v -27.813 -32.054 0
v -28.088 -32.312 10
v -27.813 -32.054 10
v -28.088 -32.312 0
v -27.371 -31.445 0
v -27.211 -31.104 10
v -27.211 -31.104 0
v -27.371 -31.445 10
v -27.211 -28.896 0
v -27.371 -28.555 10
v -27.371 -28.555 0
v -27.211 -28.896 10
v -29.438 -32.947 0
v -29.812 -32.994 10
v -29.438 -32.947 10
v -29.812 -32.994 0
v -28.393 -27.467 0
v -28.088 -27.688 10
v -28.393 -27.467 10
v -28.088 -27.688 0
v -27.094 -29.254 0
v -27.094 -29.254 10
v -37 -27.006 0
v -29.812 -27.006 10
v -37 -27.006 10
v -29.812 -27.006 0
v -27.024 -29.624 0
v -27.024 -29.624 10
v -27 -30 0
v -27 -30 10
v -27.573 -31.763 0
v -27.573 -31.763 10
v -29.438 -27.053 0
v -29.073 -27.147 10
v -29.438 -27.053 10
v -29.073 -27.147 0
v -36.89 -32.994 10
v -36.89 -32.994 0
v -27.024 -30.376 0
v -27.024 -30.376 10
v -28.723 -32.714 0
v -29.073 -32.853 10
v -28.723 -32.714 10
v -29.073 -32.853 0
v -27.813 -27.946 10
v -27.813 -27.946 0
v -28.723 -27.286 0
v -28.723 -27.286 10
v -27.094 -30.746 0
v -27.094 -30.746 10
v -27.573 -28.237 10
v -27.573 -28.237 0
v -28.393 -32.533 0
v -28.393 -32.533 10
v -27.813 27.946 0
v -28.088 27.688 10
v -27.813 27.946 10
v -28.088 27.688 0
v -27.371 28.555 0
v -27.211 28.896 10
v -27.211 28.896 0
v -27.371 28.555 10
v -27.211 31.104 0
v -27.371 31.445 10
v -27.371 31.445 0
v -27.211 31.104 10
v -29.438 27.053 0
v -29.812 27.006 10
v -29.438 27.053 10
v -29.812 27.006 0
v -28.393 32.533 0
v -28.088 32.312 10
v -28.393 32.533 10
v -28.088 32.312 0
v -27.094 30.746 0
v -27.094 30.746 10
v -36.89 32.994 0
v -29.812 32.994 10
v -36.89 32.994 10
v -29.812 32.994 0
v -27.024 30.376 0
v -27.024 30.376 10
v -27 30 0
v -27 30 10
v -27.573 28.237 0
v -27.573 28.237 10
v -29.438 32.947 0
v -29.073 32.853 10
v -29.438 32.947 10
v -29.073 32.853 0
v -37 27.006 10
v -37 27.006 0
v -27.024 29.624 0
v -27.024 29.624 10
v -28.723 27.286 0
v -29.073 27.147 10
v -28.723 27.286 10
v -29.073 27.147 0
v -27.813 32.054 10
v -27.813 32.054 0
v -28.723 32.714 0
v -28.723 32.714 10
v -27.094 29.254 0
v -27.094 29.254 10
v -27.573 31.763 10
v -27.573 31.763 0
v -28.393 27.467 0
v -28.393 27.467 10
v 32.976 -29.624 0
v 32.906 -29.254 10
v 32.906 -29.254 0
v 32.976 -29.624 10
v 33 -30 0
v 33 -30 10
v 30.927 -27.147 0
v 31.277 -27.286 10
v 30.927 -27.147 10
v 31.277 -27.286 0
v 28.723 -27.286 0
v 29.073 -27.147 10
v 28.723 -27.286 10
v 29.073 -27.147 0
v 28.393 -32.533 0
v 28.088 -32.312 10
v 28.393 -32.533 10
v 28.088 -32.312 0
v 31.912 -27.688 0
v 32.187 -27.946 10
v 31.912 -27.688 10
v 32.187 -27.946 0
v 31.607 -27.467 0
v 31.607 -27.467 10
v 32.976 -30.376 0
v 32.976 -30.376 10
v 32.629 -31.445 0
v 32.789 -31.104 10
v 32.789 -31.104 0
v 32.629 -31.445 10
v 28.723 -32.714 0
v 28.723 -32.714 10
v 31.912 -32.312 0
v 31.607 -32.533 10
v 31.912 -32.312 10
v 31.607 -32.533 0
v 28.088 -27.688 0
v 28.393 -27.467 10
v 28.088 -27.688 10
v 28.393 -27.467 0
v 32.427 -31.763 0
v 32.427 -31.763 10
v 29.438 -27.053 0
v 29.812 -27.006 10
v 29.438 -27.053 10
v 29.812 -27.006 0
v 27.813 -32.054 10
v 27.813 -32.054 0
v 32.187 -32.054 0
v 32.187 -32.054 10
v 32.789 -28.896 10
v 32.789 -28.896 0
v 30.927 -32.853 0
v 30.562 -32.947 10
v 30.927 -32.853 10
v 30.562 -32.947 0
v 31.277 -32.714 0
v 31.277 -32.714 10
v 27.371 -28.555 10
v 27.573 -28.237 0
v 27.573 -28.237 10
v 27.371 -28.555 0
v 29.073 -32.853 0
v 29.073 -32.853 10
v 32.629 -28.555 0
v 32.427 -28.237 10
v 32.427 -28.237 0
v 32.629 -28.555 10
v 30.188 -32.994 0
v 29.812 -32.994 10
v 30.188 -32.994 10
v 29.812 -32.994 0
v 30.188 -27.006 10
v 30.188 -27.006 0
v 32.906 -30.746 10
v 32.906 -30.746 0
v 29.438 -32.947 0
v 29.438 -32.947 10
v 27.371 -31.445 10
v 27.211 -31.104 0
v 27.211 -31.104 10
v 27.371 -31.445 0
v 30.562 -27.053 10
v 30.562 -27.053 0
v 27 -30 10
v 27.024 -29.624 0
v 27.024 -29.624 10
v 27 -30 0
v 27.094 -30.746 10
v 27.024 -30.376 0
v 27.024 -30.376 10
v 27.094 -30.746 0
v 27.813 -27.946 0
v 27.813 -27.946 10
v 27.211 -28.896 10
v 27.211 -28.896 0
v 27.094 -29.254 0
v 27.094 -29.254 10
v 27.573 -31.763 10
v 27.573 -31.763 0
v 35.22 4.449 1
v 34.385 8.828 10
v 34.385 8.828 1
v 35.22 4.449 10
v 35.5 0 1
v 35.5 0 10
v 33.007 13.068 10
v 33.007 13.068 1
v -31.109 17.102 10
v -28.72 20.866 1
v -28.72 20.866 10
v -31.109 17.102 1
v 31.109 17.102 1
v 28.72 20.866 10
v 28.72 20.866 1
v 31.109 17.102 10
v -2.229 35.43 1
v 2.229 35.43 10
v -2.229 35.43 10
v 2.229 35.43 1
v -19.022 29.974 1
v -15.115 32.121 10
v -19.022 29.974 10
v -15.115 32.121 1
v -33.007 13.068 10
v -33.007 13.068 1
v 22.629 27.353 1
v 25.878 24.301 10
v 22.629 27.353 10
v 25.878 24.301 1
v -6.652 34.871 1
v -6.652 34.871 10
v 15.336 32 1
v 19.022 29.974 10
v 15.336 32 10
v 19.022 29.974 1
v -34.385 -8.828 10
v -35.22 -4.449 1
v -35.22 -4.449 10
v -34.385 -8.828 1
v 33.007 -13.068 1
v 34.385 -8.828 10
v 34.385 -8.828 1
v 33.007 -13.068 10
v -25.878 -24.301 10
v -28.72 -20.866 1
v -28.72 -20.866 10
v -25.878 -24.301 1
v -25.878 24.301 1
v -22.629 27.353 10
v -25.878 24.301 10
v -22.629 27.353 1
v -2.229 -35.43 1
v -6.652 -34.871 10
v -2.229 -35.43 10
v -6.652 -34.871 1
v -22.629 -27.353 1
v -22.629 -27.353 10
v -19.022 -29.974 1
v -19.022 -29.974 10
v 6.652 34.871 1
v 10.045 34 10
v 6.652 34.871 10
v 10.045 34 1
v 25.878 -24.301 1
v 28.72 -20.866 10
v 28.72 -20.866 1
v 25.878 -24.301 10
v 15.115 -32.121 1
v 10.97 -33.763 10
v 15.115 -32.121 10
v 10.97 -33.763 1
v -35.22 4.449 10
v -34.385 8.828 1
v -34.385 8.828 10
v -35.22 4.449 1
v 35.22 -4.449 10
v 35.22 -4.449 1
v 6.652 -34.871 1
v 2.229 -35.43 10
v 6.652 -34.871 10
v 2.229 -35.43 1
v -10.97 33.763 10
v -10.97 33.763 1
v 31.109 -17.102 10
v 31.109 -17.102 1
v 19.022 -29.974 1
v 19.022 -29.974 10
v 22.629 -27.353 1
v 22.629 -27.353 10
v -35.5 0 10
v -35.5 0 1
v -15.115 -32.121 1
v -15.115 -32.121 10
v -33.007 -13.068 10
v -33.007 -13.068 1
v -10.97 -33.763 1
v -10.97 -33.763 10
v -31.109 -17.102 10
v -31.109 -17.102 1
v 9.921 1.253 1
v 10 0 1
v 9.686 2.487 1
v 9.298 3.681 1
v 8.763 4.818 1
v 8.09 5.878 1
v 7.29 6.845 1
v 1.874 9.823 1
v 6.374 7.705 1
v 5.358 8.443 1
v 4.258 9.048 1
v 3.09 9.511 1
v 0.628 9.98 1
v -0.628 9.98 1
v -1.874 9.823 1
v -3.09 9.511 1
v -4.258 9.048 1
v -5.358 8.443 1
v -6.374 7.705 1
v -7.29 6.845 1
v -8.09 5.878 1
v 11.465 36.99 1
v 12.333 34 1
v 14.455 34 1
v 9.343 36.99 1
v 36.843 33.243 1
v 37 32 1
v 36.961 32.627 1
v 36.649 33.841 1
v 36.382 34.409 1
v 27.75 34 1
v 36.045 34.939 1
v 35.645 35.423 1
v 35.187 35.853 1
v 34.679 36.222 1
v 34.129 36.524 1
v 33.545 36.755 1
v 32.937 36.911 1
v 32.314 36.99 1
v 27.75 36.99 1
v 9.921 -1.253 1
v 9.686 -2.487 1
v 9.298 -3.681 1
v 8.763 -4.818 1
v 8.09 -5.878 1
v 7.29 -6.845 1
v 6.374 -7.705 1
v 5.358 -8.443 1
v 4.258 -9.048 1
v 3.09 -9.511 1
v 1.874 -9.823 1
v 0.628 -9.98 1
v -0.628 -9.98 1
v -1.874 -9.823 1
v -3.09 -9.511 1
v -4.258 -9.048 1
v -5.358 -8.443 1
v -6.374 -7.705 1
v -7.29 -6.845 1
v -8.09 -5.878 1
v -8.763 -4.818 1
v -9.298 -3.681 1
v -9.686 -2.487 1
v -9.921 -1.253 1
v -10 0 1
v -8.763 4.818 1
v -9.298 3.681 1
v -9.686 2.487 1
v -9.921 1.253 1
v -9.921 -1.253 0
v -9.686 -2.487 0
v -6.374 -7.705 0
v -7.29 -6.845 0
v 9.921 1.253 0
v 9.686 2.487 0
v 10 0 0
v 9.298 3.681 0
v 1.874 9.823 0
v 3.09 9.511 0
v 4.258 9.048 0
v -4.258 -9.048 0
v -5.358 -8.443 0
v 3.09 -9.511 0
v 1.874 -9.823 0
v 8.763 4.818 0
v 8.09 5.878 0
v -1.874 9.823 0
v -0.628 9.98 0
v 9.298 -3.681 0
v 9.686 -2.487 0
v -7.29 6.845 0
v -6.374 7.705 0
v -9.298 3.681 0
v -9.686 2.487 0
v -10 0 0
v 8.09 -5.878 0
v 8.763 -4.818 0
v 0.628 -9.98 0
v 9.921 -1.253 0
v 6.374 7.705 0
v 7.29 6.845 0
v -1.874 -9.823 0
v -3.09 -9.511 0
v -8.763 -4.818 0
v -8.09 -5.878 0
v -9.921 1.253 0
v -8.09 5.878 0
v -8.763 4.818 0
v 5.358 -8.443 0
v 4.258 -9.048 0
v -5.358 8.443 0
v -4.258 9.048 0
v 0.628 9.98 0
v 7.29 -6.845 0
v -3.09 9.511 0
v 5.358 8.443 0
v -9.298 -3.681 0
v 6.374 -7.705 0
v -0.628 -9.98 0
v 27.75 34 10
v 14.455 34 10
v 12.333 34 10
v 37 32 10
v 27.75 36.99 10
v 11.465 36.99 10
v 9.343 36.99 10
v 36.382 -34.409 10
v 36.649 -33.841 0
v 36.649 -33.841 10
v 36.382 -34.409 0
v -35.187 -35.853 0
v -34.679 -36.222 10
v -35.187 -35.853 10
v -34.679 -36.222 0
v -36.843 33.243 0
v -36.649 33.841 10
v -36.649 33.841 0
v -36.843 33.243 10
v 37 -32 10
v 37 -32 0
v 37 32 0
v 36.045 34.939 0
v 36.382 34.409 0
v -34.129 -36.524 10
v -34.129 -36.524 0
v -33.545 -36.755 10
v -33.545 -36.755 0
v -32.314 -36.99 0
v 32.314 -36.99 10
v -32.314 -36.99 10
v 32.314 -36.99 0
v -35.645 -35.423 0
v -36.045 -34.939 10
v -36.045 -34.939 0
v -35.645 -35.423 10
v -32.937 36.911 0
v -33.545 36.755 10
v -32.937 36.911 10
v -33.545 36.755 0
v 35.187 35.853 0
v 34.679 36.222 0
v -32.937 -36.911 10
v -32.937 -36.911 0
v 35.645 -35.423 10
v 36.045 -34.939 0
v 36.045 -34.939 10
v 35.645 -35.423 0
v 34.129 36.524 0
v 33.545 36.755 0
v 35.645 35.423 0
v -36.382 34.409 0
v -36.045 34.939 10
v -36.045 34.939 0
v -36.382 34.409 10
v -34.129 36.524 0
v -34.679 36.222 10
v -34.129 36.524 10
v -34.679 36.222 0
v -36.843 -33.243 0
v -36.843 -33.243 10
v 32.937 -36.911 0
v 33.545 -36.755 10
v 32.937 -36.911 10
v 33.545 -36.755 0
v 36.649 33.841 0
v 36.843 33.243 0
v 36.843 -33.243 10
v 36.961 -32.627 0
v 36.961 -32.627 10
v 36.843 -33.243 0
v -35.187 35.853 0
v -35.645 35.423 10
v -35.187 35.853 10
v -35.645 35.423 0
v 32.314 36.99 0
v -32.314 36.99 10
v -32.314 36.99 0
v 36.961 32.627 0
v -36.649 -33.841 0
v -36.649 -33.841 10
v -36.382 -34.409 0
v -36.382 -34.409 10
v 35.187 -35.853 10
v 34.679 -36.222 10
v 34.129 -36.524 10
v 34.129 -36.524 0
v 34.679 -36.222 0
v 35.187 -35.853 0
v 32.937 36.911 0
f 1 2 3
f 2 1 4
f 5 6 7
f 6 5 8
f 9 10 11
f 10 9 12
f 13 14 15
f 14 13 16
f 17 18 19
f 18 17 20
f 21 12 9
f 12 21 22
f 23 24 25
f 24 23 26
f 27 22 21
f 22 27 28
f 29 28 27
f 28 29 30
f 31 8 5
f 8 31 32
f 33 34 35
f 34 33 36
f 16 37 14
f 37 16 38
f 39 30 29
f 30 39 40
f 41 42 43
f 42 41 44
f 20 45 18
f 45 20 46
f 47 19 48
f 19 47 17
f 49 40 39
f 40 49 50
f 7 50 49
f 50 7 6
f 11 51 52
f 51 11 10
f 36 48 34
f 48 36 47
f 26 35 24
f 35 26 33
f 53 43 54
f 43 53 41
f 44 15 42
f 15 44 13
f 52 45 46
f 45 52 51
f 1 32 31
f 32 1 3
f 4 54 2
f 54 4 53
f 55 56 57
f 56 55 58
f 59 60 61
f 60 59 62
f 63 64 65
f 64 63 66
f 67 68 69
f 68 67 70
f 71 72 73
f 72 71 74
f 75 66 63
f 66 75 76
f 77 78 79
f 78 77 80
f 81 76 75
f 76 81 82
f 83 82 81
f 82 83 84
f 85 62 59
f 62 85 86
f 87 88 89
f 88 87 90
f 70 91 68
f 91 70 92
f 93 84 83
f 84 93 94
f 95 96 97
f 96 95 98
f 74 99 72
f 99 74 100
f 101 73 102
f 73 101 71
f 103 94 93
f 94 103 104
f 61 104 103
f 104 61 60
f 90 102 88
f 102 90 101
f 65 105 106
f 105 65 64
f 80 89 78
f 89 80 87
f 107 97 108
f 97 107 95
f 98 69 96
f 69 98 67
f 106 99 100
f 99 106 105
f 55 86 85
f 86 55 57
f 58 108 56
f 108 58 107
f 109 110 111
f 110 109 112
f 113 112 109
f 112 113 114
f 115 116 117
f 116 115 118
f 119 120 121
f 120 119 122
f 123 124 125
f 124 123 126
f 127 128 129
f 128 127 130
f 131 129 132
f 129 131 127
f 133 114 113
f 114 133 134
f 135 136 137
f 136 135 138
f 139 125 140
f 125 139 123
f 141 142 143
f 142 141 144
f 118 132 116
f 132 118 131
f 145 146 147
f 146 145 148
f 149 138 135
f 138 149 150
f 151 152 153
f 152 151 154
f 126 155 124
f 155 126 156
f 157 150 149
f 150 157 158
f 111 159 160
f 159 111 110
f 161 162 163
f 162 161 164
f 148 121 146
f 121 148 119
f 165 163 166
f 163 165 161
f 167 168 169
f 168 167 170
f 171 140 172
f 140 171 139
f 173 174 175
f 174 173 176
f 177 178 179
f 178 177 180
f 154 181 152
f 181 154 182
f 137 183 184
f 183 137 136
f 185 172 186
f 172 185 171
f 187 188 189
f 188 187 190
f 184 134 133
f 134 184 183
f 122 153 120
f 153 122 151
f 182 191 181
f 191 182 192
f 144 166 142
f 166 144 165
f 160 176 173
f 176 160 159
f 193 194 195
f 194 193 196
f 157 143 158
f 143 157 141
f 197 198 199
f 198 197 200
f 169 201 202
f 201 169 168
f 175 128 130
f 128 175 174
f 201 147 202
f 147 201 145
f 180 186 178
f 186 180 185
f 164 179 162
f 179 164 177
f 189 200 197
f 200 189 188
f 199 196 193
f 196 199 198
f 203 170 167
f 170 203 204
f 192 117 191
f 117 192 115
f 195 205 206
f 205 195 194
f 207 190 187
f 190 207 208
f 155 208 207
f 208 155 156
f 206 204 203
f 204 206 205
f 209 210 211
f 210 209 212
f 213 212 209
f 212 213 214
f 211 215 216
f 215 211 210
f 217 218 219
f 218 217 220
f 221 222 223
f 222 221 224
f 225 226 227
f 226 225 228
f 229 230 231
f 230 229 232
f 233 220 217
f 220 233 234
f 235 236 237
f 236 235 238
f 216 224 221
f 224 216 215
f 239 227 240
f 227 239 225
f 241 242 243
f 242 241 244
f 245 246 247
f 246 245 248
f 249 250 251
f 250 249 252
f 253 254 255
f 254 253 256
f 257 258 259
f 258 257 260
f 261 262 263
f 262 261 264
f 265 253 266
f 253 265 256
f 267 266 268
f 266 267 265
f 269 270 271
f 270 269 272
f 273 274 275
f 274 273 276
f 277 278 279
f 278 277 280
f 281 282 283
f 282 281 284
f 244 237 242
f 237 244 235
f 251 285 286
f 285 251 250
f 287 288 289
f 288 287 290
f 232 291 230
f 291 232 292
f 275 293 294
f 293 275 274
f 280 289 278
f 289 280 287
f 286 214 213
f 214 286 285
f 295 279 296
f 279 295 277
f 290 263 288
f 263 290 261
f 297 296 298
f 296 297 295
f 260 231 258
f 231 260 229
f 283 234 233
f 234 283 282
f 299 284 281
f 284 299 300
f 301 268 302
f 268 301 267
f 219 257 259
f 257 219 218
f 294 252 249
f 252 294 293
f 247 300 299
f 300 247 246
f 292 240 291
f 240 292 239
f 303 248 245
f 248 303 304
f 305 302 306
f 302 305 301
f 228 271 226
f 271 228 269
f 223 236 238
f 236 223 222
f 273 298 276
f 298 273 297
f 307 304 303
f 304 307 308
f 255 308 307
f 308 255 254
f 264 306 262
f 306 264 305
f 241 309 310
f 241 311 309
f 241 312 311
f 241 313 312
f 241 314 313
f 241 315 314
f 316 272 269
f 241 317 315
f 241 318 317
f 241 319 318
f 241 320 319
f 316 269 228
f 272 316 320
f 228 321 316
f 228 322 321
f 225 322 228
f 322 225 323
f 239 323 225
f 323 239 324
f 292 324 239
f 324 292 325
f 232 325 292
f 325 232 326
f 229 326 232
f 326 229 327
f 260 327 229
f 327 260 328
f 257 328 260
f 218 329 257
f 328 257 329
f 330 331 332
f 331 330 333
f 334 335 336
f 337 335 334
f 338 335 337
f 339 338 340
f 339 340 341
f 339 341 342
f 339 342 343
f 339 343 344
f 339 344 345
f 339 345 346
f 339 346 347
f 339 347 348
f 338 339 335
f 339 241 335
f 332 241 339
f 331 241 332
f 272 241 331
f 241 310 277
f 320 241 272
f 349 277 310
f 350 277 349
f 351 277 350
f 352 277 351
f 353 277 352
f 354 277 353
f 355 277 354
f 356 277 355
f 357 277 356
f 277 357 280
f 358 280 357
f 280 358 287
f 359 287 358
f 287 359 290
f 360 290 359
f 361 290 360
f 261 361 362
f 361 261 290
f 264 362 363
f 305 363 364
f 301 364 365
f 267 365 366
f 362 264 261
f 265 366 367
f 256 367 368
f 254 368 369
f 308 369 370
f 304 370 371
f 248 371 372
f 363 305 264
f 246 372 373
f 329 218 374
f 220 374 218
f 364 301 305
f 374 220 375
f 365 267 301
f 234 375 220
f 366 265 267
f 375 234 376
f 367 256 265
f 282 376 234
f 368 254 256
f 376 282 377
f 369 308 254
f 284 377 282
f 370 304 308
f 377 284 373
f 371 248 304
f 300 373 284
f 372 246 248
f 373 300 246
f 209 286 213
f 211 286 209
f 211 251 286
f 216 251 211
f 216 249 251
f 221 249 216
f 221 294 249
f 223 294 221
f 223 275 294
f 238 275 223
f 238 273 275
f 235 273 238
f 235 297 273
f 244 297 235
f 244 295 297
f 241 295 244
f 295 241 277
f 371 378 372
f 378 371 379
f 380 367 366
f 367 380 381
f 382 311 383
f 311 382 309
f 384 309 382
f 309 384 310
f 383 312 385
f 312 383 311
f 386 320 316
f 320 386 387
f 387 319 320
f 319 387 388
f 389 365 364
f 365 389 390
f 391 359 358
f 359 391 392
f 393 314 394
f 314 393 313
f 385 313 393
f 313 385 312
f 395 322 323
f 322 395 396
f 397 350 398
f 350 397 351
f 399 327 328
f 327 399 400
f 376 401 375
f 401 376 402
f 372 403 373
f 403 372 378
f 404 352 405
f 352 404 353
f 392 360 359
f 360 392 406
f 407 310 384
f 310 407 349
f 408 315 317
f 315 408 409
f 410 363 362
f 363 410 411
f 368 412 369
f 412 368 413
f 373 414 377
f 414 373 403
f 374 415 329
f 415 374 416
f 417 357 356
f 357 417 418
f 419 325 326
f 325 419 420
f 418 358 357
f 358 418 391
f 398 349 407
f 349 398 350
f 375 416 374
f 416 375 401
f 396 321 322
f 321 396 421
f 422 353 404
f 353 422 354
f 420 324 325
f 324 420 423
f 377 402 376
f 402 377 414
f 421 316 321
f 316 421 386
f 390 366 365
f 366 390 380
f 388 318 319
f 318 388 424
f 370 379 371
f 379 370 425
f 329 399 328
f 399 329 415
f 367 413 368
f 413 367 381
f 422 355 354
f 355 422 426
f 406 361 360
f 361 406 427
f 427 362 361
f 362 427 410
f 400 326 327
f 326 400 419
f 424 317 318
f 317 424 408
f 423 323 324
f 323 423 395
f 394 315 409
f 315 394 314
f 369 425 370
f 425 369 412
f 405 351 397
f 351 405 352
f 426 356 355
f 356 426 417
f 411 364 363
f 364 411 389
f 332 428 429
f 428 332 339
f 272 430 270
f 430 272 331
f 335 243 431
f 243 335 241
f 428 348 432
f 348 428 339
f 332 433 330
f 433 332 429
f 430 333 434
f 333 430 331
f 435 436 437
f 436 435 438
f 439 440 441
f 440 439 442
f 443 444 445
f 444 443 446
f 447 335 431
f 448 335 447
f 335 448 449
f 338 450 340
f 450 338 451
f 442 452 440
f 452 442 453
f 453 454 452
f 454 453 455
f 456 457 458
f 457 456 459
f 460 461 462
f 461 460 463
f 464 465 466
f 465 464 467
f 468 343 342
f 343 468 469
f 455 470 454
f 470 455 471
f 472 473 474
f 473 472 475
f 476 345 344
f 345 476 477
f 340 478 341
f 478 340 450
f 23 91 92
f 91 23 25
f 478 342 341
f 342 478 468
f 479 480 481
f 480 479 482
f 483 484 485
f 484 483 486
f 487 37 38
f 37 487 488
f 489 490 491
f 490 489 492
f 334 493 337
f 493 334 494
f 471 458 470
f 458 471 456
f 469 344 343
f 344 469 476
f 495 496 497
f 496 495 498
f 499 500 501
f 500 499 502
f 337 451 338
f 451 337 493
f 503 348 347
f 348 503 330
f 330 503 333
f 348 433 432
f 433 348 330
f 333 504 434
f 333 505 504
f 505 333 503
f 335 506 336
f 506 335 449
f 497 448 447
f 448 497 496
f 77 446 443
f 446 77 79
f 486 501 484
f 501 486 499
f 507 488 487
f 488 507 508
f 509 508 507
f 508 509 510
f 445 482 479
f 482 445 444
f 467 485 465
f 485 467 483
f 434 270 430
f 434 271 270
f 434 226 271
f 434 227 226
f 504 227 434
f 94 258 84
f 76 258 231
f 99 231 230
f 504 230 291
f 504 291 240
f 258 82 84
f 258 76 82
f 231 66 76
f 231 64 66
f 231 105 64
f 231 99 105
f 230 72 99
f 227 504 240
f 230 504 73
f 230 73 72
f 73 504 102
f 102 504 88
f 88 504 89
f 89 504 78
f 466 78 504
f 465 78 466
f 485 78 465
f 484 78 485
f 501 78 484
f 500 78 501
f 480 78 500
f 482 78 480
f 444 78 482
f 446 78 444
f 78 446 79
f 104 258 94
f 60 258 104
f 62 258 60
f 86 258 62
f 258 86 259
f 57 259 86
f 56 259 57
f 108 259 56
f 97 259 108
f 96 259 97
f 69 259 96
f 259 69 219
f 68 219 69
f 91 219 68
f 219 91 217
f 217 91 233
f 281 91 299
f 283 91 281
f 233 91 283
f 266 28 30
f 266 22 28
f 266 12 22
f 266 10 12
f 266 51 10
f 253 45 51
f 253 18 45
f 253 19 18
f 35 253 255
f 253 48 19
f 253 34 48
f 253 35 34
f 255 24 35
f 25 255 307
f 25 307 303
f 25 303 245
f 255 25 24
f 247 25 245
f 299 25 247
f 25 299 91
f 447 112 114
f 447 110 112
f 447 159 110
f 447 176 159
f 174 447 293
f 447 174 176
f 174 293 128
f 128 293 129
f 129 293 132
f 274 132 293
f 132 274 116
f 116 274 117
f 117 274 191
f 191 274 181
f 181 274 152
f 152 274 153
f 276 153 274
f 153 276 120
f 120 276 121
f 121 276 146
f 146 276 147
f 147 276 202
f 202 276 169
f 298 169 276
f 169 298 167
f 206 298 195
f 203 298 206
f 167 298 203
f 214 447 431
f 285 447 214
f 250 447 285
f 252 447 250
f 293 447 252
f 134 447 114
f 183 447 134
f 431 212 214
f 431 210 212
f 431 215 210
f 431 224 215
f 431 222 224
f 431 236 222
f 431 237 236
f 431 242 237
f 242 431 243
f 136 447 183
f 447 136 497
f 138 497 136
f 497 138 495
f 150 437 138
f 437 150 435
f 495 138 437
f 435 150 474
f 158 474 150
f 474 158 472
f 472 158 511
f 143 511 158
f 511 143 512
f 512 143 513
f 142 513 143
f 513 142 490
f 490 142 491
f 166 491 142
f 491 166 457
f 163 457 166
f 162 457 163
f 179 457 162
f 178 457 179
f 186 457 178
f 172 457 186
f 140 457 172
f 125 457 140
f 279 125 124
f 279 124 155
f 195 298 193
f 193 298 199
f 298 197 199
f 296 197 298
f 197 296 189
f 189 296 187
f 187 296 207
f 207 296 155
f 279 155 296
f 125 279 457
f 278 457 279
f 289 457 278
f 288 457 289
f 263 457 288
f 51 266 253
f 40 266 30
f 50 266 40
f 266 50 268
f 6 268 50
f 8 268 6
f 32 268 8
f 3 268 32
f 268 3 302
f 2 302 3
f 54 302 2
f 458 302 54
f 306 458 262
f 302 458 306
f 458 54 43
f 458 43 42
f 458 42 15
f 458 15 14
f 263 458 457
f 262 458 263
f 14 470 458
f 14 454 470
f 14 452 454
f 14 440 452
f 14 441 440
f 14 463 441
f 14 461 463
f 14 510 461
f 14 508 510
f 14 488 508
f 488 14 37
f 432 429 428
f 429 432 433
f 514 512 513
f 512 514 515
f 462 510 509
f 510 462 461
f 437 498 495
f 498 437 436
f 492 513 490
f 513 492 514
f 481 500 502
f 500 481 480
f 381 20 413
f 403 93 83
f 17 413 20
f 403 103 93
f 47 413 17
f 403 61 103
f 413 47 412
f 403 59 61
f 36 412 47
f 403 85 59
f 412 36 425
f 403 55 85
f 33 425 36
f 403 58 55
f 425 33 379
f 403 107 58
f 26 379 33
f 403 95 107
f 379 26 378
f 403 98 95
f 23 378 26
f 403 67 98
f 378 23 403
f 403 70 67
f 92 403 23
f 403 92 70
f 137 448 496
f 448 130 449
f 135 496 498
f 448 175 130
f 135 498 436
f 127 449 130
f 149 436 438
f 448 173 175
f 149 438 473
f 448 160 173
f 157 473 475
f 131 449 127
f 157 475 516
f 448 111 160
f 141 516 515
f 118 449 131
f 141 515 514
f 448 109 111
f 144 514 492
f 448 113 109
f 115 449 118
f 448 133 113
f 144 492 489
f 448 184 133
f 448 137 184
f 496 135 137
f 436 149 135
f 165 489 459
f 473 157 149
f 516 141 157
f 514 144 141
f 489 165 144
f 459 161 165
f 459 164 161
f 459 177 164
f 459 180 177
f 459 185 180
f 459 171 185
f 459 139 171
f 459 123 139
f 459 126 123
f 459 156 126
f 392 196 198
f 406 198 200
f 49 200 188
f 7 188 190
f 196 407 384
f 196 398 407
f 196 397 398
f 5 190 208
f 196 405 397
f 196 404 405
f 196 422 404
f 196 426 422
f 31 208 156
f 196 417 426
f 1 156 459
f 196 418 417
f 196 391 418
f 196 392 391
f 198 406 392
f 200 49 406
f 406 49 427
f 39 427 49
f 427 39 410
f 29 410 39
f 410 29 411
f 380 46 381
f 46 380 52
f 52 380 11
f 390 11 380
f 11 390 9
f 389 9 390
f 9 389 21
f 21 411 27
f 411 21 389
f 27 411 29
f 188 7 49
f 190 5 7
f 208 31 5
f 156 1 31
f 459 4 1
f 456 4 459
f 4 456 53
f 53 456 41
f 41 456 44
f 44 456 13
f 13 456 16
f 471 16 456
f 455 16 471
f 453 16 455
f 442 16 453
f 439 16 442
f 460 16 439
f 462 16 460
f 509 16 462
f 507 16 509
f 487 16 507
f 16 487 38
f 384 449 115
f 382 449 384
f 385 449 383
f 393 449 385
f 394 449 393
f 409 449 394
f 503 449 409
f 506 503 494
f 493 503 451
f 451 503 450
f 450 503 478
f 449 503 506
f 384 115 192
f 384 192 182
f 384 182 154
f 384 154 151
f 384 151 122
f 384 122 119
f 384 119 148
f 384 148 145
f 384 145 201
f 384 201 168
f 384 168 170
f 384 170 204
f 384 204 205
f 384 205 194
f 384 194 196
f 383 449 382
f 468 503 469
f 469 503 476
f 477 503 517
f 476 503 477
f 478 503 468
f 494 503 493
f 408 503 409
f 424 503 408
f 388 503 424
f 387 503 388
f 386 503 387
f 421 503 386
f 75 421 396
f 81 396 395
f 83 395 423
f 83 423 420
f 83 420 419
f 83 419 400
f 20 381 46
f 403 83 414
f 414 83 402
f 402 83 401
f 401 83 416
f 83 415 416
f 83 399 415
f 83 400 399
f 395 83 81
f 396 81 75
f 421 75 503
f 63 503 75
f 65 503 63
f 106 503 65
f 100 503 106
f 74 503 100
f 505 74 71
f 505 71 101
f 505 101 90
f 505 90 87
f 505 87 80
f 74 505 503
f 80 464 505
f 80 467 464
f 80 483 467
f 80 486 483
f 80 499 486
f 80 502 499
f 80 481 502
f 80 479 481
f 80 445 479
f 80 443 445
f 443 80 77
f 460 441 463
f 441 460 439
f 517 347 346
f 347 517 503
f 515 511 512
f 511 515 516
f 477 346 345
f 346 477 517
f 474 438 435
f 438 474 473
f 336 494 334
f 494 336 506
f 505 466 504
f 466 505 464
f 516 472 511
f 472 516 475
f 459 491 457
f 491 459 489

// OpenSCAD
$fn = 50;


difference() {
	union() {
		translate(v = [0, 0, 0]) {
			rotate(a = [0, 0, 0]) {
				hull() {
					translate(v = [-32.0000000000, 32.0000000000, 0]) {
						rotate(a = [0, 0, 0]) {
							translate(v = [0, 0, 0]) {
								rotate(a = [0, 0, 0]) {
									cylinder(h = 10, r = 5);
								}
							}
						}
					}
					translate(v = [32.0000000000, 32.0000000000, 0]) {
						rotate(a = [0, 0, 0]) {
							translate(v = [0, 0, 0]) {
								rotate(a = [0, 0, 0]) {
									cylinder(h = 10, r = 5);
								}
							}
						}
					}
					translate(v = [-32.0000000000, -32.0000000000, 0]) {
						rotate(a = [0, 0, 0]) {
							translate(v = [0, 0, 0]) {
								rotate(a = [0, 0, 0]) {
									cylinder(h = 10, r = 5);
								}
							}
						}
					}
					translate(v = [32.0000000000, -32.0000000000, 0]) {
						rotate(a = [0, 0, 0]) {
							translate(v = [0, 0, 0]) {
								rotate(a = [0, 0, 0]) {
									cylinder(h = 10, r = 5);
								}
							}
						}
					}
				}
			}
		}
	}
	union() {
		translate(v = [-37.5000000000, -30.0000000000, -125]) {
			rotate(a = [0, 0, 0]) {
				hull() {
					translate(v = [7.5000000000, 0, 0]) {
						rotate(a = [0, 0, 0]) {
							translate(v = [0, 0, 0]) {
								rotate(a = [0, 0, 0]) {
									cylinder(h = 250, r = 3.0000000000);
								}
							}
						}
					}
					translate(v = [-7.5000000000, 0, 0]) {
						rotate(a = [0, 0, 0]) {
							translate(v = [0, 0, 0]) {
								rotate(a = [0, 0, 0]) {
									cylinder(h = 250, r = 3.0000000000);
								}
							}
						}
					}
				}
			}
		}
		translate(v = [-37.5000000000, 30.0000000000, -125]) {
			rotate(a = [0, 0, 0]) {
				hull() {
					translate(v = [7.5000000000, 0, 0]) {
						rotate(a = [0, 0, 0]) {
							translate(v = [0, 0, 0]) {
								rotate(a = [0, 0, 0]) {
									cylinder(h = 250, r = 3.0000000000);
								}
							}
						}
					}
					translate(v = [-7.5000000000, 0, 0]) {
						rotate(a = [0, 0, 0]) {
							translate(v = [0, 0, 0]) {
								rotate(a = [0, 0, 0]) {
									cylinder(h = 250, r = 3.0000000000);
								}
							}
						}
					}
				}
			}
		}
		translate(v = [30.0000000000, -30.0000000000, -125.0000000000]) {
			rotate(a = [0, 0, 0]) {
				cylinder(h = 250, r = 3.0000000000);
			}
		}
		translate(v = [0, 0, 1.0000000000]) {
			rotate(a = [0, 0, 0]) {
				cylinder(h = 12, r = 35.5000000000);
			}
		}
		translate(v = [0, 0, -5.0000000000]) {
			rotate(a = [0, 0, 0]) {
				cylinder(h = 10, r = 10.0000000000);
			}
		}
		translate(v = [0.0000000000, 32.0000000000, 1]) {
			rotate(a = [0, 0, 0]) {
				cube(size = [37.0000000000, 2, 12]);
			}
		}
		translate(v = [27.7500000000, 32.0000000000, 1]) {
			rotate(a = [0, 0, 0]) {
				cube(size = [9.2500000000, 5, 12]);
			}
		}
		translate(v = [8.5833333333, 37.7500000000, 1]) {
			rotate(a = [0, 0, -45]) {
				cube(size = [7.5000000000, 1.5000000000, 12]);
			}
		}
	}
}
